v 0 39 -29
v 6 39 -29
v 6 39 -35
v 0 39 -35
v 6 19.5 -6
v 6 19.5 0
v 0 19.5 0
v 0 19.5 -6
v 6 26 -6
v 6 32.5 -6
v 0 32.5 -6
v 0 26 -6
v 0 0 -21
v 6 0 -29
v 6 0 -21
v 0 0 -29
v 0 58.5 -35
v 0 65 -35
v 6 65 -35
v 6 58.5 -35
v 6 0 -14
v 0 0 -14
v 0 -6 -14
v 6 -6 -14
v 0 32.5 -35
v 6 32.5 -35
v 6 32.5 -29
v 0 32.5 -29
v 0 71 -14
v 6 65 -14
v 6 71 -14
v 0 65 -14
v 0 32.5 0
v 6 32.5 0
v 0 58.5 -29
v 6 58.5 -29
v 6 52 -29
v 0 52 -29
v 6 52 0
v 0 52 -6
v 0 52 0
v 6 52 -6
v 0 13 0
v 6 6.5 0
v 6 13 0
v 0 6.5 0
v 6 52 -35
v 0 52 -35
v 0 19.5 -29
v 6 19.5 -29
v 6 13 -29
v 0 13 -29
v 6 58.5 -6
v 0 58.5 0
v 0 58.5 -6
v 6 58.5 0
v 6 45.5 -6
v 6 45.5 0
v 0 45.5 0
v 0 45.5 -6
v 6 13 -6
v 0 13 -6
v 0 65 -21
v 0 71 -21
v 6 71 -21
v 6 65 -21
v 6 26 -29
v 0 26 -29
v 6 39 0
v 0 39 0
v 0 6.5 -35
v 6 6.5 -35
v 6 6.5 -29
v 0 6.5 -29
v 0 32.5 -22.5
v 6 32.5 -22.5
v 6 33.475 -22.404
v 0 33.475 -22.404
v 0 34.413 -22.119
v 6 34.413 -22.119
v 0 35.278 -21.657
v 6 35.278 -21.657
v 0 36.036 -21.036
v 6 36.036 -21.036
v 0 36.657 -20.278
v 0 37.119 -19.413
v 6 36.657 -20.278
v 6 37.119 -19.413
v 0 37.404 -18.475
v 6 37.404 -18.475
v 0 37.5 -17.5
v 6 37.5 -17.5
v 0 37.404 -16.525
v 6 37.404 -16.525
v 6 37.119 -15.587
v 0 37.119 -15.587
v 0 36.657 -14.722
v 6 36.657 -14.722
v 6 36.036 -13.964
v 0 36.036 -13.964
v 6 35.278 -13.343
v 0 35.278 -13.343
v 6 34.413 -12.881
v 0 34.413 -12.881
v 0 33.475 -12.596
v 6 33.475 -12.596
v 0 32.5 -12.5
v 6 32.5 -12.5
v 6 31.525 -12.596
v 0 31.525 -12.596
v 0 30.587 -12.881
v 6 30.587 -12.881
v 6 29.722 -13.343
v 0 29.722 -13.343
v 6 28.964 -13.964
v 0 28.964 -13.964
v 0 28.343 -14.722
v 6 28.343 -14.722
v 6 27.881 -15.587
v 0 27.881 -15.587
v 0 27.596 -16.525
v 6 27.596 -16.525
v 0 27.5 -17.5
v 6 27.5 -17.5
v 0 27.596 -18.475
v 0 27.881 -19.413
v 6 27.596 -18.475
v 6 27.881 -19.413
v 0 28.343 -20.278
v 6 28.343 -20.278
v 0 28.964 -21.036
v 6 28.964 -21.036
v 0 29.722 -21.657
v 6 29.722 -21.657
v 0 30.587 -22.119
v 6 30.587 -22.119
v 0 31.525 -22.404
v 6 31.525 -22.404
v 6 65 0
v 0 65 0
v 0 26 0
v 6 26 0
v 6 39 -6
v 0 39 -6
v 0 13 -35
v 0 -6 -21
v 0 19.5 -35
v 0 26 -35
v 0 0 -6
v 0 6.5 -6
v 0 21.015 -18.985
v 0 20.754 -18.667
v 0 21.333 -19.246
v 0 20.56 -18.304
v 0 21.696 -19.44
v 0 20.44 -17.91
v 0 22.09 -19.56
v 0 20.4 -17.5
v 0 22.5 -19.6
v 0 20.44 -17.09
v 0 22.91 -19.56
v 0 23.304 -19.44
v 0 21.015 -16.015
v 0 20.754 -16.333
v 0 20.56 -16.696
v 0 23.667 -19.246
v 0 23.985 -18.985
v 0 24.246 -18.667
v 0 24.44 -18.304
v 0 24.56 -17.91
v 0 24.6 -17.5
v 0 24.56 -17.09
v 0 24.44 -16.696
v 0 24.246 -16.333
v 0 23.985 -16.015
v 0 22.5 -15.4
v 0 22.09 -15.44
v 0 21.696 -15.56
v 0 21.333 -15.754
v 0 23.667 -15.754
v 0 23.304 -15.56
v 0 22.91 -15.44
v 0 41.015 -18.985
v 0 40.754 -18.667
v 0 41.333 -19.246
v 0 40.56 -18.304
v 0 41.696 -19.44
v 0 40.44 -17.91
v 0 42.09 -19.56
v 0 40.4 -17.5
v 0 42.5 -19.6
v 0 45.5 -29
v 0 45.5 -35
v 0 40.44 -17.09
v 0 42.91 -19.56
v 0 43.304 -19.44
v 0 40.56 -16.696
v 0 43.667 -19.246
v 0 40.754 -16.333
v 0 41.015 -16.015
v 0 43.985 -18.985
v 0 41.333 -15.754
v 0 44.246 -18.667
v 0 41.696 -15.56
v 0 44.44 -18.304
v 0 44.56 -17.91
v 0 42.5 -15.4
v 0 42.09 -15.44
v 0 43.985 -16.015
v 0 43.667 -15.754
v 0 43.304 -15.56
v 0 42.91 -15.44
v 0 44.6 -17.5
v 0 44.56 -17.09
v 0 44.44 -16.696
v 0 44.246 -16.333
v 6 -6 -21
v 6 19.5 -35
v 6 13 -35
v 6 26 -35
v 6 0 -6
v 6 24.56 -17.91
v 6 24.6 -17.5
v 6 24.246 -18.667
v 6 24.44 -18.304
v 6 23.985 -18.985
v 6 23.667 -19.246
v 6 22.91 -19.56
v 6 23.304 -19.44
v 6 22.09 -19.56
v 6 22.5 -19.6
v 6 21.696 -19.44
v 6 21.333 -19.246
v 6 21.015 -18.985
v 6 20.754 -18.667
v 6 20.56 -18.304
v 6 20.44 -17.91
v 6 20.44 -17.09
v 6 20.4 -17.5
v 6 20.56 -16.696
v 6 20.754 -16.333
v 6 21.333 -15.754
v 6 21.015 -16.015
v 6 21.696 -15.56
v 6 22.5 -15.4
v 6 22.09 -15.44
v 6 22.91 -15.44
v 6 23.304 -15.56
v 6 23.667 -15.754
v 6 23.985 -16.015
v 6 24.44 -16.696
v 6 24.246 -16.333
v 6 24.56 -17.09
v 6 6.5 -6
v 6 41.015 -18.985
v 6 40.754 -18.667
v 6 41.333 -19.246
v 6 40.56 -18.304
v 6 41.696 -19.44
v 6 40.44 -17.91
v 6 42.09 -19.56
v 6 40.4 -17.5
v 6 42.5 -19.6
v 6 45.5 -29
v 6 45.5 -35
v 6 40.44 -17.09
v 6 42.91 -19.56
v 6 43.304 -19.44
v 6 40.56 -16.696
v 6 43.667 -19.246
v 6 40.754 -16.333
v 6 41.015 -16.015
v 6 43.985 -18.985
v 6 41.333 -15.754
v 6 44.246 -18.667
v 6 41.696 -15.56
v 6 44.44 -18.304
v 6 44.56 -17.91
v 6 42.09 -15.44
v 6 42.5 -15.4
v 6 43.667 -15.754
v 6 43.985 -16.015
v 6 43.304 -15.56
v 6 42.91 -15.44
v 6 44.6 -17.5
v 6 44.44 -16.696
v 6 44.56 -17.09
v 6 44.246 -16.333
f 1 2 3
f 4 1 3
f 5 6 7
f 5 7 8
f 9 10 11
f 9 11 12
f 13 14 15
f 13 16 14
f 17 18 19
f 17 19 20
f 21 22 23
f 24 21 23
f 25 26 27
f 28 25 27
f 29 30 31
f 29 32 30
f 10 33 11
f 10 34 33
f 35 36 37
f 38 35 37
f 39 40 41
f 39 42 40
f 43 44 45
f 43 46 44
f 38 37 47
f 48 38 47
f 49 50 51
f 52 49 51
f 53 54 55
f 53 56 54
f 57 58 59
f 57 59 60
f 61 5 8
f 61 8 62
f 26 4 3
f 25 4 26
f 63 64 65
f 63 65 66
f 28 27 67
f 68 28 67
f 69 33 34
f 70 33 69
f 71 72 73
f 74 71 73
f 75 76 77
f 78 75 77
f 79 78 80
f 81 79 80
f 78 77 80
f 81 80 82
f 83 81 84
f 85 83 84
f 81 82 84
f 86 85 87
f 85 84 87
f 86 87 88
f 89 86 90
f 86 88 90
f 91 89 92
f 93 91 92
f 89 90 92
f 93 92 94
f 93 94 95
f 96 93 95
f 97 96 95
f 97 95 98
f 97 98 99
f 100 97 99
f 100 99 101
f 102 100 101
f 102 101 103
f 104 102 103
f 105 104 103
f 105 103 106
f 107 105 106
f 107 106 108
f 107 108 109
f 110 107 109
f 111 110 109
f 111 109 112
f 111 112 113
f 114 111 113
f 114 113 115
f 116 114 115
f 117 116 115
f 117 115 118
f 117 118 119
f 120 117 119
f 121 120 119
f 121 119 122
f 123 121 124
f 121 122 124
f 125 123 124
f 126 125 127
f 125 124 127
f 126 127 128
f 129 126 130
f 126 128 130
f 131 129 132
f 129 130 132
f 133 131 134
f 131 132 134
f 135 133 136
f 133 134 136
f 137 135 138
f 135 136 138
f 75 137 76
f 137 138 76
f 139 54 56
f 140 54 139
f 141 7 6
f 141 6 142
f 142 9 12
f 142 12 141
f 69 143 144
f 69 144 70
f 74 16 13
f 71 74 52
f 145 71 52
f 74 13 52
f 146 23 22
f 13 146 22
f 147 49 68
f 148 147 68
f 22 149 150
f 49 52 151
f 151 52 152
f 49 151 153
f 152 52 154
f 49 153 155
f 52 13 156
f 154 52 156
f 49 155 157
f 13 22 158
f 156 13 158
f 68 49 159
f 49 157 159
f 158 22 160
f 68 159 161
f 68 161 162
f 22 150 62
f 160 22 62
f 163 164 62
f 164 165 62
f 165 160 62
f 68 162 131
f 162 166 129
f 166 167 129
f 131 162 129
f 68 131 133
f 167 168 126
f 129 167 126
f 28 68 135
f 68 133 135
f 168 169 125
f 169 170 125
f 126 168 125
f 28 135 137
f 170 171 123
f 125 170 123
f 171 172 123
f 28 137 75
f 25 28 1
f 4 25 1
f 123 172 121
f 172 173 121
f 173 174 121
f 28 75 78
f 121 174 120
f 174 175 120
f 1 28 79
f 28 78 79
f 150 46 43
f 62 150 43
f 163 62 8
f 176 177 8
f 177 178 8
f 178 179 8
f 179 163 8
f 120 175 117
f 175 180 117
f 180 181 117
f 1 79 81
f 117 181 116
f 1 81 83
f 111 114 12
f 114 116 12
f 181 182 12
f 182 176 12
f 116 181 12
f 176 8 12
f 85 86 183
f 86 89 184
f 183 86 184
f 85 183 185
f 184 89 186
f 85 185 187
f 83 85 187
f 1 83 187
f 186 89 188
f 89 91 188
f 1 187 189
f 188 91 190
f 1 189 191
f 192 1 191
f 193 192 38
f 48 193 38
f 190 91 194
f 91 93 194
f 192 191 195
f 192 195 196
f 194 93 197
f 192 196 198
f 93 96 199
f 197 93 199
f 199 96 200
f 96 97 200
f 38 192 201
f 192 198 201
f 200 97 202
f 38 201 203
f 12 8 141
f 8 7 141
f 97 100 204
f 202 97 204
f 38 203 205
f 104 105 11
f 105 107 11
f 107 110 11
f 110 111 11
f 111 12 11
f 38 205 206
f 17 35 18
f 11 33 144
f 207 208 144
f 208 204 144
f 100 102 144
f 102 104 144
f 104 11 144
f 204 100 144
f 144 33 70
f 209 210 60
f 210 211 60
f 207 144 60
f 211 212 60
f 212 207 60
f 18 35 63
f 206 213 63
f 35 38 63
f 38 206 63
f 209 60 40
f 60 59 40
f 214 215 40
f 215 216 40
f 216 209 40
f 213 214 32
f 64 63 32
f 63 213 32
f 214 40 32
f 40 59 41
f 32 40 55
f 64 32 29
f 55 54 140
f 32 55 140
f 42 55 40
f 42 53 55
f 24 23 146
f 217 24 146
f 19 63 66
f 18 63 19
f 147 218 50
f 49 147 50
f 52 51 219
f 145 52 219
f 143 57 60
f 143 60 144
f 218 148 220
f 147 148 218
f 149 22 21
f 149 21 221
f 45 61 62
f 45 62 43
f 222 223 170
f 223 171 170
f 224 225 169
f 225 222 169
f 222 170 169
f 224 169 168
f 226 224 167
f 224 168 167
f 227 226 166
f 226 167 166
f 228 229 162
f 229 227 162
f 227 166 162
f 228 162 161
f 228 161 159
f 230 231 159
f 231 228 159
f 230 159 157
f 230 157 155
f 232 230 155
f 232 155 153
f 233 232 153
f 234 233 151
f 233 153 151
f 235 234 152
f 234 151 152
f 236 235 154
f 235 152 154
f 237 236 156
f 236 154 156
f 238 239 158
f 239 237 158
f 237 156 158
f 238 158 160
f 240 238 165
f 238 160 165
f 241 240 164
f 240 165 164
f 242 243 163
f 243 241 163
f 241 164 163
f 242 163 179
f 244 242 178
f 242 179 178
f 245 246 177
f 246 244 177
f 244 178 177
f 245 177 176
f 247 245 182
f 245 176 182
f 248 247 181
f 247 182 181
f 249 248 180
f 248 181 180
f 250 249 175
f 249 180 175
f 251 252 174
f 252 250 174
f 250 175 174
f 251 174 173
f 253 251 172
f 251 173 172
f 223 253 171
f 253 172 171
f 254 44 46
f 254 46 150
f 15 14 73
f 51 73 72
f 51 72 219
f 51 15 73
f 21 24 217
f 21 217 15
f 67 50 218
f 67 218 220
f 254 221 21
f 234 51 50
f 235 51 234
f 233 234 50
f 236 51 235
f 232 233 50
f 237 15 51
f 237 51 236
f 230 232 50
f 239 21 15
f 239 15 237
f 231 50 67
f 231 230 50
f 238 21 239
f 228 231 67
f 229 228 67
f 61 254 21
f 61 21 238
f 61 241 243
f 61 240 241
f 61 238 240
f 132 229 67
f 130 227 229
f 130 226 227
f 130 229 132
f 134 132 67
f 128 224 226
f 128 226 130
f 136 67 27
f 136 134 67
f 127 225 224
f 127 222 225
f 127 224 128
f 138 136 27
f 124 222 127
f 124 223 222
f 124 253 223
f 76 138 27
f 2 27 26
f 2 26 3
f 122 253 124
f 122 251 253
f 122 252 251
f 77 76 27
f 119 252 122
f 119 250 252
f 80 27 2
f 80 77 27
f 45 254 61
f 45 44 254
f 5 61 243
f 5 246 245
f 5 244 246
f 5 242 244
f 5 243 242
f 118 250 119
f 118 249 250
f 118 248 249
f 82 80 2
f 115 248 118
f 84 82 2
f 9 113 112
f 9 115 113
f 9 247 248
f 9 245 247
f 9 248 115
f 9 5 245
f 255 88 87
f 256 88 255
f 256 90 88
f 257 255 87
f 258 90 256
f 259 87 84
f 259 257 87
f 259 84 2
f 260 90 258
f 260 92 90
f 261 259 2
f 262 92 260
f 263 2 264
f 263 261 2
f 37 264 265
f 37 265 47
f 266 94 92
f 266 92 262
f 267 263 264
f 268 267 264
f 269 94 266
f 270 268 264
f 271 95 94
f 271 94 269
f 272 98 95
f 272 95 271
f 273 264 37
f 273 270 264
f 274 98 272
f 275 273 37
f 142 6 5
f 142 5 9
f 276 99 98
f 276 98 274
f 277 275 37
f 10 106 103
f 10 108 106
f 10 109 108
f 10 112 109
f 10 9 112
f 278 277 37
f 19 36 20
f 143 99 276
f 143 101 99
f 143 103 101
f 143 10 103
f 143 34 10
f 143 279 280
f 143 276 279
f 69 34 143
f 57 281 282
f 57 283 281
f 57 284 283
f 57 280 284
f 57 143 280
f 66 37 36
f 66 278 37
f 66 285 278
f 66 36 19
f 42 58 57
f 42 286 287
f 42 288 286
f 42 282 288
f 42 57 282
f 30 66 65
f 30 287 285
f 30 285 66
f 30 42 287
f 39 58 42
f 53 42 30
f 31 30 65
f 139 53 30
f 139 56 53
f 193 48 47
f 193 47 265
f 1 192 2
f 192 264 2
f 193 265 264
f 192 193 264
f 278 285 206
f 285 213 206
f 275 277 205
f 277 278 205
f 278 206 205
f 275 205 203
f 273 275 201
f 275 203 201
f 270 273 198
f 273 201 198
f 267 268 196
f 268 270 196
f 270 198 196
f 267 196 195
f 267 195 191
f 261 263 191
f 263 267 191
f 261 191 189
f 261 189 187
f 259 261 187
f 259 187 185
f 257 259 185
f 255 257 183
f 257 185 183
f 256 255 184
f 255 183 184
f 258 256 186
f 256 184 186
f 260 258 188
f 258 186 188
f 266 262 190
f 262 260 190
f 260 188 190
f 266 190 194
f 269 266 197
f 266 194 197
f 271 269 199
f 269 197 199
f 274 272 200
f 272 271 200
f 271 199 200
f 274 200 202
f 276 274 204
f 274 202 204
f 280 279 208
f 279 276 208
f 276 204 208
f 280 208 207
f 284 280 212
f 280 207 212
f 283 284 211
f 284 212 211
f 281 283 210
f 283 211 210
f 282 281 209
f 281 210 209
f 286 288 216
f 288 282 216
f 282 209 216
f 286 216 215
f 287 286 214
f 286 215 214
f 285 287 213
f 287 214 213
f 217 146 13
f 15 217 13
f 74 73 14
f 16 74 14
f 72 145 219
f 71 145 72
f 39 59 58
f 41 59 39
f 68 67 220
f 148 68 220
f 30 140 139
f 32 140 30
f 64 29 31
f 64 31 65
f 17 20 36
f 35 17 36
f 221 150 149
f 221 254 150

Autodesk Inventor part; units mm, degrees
ref_plane "YZ Plane" through (0, 0, 0) normal (1, 0, 0) x (0, 1, 0)
ref_plane "XZ Plane" through (0, 0, 0) normal (0, 1, 0) x (-1, 0, 0)
ref_plane "XY Plane" through (0, 0, 0) normal (0, 0, 1) x (1, 0, 0)
sketch "Sketch1" plane through (0, 0, 0) normal (1, 0, 0) x (0, 1, 0)
  line L0 (0, 0) -> (65, 0)
  line L1 (65, -35) -> (0, -35)
  line L2 (65, -14) -> (71, -14)
  line L3 (71, -14) -> (71, -21)
  line L4 (71, -21) -> (65, -21)
  line L5 (0, -14) -> (-6, -14)
  line L6 (-6, -14) -> (-6, -21)
  line L7 (-6, -21) -> (0, -21)
  line L8 (65, 0) -> (65, -14)
  line L9 (65, -21) -> (65, -35)
  line L10 (0, -35) -> (0, -21)
  line L11 (0, -14) -> (0, 0)
  line L12 (32.5, -17.5) -> (22.5, -17.5)
  circle A0 centre (42.5, -17.5) radius 2.1
  circle A1 centre (22.5, -17.5) radius 2.1
  dimension "d0" = 65
  dimension "d1" = 35
  dimension "d3" = 6
  dimension "d4" = 7
  dimension "d6" = 6
  dimension "d7" = 7
  dimension "d8" = 10
  dimension "d10" = 4.2
  dimension "d11" = 4.2
extrude "Extrusion1" add sketch "Sketch1" along normal blind 6
sketch "Sketch2" plane through (6, 0, 0) normal (1, 0, 0) x (0, 0, -1)
  line L0 (14, 65) -> (0, 65) projected
  line L1 (0, 65) -> (0, 58.5)
  line L2 (0, 65) -> (0, 0) projected
  line L3 (0, 58.5) -> (6, 58.5)
  line L4 (6, 58.5) -> (6, 52)
  line L5 (6, 52) -> (0, 52)
  line L6 (0, 52) -> (0, 58.5)
  line L7 (35, 65) -> (35, 58.5)
  line L8 (35, 0) -> (35, 65) projected
  line L9 (35, 58.5) -> (29, 58.5)
  line L10 (29, 58.5) -> (29, 52)
  line L11 (29, 52) -> (35, 52)
  line L12 (35, 52) -> (35, 58.5)
  dimension "d15" = 6.5
  dimension "d16" = 6
  dimension "d17" = 6.5
  dimension "d18" = 6.5
  dimension "d19" = 6
  dimension "d20" = 6.5
extrude "Extrusion2" cut sketch "Sketch2" against normal blind 10
pattern_linear "Rectangular Pattern1" count 5 spacing 13 along (0, -1, 0) of "Extrusion2"
sketch "Sketch3" plane through (6, 0, 0) normal (1, 0, 0) x (0, 0, -1)
  circle A0 centre (17.5, 42.5) radius 2.1 projected
  circle A1 centre (17.5, 32.5) radius 5
  point P0 (0, 0)
  dimension "d27" = 10
extrude "Extrusion3" cut sketch "Sketch3" against normal blind 10 contours A1
properties part number "g_arm_v_2"
